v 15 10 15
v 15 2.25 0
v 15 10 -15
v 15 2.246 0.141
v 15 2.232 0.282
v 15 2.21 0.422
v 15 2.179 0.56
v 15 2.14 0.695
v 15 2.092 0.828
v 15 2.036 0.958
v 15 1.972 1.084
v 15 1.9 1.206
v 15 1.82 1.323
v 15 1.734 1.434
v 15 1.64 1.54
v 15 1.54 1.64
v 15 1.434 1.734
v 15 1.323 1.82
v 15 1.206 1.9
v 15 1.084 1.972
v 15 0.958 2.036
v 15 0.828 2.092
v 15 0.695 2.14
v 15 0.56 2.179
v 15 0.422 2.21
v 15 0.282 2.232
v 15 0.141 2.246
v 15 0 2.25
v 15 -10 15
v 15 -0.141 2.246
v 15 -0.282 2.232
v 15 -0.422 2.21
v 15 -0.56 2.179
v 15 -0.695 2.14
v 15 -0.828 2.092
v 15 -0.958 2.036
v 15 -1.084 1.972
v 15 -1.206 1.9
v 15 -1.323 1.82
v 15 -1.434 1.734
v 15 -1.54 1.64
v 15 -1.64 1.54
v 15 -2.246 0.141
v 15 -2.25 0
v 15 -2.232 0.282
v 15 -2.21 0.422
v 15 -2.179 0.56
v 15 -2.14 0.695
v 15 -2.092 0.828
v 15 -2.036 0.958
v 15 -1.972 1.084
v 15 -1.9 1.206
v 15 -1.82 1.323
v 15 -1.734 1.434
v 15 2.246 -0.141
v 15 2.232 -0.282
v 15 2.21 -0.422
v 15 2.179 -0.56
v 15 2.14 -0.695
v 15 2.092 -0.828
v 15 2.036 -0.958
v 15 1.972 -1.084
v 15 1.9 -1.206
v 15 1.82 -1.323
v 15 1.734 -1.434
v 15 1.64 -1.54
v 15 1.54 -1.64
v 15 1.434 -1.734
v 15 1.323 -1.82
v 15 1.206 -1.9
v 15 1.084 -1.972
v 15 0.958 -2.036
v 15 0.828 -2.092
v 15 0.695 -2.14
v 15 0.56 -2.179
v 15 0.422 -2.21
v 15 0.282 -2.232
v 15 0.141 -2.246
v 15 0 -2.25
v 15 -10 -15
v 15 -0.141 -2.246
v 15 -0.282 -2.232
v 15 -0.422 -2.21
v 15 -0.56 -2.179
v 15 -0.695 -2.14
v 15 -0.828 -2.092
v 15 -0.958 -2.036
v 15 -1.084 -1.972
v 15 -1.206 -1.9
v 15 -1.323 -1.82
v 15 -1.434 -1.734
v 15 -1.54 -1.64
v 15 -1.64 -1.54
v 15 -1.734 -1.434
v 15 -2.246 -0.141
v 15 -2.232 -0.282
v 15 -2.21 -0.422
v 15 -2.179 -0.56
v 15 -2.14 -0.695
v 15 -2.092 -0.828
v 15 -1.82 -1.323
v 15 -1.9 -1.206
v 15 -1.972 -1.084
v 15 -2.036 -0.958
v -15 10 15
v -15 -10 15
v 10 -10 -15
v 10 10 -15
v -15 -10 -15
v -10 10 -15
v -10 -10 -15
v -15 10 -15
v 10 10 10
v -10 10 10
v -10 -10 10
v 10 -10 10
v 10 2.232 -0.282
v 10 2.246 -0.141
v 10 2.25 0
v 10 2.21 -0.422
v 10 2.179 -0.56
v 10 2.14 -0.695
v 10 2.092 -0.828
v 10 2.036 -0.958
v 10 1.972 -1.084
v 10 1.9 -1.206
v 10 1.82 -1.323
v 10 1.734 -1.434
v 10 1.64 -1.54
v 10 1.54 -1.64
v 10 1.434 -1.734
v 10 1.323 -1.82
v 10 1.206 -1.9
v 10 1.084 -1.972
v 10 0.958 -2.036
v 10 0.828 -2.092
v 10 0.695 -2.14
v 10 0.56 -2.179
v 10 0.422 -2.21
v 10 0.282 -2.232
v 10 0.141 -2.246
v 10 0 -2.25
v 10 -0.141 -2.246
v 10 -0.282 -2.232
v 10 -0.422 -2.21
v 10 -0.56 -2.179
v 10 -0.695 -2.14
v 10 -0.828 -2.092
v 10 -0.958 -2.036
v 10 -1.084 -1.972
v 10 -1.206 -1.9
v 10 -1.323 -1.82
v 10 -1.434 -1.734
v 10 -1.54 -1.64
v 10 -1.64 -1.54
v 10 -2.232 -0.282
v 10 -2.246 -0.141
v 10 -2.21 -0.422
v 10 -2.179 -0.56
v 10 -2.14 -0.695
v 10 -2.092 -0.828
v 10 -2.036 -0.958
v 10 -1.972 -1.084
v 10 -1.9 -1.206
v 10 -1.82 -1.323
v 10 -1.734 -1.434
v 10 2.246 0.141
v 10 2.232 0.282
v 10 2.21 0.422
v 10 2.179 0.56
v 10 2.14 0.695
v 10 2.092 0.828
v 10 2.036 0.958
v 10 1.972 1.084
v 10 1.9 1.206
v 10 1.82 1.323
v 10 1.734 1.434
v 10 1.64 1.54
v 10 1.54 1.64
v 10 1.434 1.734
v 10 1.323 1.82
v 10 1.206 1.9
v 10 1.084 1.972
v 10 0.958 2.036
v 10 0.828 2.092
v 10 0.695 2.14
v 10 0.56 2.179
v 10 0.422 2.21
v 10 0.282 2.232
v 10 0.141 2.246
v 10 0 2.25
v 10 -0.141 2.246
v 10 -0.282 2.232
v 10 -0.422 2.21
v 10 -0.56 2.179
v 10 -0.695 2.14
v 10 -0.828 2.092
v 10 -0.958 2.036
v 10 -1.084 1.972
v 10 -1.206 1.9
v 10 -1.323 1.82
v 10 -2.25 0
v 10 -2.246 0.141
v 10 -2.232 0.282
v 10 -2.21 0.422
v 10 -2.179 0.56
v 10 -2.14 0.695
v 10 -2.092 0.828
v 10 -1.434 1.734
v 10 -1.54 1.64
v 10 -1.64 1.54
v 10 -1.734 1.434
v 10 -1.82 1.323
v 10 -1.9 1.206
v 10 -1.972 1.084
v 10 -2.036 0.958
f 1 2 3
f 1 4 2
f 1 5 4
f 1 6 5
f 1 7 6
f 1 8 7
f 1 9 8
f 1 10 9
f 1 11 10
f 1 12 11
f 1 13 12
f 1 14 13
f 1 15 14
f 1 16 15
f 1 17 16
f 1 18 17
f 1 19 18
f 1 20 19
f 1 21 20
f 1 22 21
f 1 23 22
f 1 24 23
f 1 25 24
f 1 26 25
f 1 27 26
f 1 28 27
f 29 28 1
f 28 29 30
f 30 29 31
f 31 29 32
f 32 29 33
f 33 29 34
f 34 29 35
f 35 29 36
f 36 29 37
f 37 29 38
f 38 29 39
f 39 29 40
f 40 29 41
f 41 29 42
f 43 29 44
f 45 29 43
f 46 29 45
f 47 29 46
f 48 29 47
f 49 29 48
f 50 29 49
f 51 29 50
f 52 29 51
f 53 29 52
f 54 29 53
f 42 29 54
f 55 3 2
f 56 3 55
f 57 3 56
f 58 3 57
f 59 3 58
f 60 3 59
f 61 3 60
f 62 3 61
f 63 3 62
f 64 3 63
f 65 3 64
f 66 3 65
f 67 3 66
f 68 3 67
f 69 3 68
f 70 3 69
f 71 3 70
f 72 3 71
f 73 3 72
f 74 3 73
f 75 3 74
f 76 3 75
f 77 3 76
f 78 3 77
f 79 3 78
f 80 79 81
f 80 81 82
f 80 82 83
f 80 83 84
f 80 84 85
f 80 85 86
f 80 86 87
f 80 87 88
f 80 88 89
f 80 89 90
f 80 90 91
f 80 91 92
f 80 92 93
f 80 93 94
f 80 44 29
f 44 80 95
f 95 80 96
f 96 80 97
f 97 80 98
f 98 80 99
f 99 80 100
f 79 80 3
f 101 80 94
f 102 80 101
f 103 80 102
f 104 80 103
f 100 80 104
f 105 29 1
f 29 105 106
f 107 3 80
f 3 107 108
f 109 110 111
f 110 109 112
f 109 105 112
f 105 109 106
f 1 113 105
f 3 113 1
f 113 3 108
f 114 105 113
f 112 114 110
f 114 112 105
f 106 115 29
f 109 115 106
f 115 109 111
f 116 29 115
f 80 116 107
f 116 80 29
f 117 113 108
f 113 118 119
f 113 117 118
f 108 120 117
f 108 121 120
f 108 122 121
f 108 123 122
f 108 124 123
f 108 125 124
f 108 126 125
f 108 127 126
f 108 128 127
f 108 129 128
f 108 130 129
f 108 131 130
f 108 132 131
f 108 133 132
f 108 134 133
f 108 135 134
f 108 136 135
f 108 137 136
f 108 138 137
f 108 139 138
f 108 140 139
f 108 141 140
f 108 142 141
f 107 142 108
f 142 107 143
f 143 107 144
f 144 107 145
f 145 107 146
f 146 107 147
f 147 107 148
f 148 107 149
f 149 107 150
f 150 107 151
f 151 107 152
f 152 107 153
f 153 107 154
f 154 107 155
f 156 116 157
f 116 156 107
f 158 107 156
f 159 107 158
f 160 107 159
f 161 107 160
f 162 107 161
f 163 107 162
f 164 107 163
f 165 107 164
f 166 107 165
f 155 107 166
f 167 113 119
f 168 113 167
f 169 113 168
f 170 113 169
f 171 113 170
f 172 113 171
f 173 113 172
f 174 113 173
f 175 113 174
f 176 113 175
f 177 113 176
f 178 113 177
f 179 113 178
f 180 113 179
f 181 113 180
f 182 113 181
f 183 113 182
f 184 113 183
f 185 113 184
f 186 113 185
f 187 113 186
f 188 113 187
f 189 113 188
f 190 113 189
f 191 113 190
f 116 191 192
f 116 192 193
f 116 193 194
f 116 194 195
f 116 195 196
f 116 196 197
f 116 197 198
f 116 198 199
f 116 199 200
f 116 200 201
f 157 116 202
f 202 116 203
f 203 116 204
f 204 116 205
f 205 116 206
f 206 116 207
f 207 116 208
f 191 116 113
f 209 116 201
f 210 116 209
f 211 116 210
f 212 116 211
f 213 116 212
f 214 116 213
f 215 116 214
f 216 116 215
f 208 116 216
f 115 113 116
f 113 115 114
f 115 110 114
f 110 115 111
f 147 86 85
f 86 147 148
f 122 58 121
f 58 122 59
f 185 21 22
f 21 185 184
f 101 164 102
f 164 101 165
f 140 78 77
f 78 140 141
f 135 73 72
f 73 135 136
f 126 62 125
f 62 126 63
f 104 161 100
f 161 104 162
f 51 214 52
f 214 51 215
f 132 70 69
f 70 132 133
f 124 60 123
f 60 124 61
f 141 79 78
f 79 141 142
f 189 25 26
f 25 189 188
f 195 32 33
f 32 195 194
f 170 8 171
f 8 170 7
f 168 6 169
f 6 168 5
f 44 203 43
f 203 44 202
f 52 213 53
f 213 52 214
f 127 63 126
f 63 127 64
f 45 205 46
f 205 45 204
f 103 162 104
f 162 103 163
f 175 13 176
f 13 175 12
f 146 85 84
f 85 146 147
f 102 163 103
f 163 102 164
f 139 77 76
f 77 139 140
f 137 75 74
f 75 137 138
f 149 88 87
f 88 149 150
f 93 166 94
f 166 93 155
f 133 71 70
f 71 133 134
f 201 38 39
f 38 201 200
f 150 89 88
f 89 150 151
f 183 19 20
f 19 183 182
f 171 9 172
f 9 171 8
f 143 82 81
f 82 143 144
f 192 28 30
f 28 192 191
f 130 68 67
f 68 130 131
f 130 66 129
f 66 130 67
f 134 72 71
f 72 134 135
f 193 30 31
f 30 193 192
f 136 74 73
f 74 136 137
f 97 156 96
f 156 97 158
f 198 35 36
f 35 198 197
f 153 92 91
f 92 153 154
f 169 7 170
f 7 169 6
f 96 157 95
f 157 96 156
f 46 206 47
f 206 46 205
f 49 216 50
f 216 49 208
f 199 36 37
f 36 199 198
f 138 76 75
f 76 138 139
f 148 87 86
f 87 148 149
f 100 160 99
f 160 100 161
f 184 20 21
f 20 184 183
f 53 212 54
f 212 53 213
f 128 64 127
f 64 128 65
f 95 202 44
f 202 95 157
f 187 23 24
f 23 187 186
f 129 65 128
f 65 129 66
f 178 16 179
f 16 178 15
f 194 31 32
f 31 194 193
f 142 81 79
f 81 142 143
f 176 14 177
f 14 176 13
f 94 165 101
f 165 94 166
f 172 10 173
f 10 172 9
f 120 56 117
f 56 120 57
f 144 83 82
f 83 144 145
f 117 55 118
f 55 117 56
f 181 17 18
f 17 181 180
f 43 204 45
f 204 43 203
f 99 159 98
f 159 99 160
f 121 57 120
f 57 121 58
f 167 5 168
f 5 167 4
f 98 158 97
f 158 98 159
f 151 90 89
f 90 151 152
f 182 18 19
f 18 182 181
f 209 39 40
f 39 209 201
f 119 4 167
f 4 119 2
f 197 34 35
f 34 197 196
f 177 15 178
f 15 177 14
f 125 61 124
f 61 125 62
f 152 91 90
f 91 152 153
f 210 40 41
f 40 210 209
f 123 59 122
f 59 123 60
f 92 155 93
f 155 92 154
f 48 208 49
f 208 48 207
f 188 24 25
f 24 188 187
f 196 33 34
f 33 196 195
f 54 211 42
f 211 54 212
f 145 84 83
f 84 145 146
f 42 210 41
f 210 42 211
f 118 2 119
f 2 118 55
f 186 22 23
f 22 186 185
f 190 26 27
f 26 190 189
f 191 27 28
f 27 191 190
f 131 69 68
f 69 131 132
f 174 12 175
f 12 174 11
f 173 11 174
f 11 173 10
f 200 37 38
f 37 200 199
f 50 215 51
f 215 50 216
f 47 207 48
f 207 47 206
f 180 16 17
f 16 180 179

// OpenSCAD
MOUNT_HOLE_DIA = 4.5;

WIDTH = 20;
THICKNESS = 5;

$fn = 100;


module hook() {
  wt = 2 * THICKNESS;
  difference() {
    cube(size = [WIDTH + wt, WIDTH, WIDTH + wt], center = true);
    translate([0, 0, -wt/2])
    cube(size = [WIDTH, WIDTH, WIDTH + wt], center = true);

    rotate([0, 90, 0])
    #cylinder(d = MOUNT_HOLE_DIA, h = WIDTH);
  }
}

hook();
